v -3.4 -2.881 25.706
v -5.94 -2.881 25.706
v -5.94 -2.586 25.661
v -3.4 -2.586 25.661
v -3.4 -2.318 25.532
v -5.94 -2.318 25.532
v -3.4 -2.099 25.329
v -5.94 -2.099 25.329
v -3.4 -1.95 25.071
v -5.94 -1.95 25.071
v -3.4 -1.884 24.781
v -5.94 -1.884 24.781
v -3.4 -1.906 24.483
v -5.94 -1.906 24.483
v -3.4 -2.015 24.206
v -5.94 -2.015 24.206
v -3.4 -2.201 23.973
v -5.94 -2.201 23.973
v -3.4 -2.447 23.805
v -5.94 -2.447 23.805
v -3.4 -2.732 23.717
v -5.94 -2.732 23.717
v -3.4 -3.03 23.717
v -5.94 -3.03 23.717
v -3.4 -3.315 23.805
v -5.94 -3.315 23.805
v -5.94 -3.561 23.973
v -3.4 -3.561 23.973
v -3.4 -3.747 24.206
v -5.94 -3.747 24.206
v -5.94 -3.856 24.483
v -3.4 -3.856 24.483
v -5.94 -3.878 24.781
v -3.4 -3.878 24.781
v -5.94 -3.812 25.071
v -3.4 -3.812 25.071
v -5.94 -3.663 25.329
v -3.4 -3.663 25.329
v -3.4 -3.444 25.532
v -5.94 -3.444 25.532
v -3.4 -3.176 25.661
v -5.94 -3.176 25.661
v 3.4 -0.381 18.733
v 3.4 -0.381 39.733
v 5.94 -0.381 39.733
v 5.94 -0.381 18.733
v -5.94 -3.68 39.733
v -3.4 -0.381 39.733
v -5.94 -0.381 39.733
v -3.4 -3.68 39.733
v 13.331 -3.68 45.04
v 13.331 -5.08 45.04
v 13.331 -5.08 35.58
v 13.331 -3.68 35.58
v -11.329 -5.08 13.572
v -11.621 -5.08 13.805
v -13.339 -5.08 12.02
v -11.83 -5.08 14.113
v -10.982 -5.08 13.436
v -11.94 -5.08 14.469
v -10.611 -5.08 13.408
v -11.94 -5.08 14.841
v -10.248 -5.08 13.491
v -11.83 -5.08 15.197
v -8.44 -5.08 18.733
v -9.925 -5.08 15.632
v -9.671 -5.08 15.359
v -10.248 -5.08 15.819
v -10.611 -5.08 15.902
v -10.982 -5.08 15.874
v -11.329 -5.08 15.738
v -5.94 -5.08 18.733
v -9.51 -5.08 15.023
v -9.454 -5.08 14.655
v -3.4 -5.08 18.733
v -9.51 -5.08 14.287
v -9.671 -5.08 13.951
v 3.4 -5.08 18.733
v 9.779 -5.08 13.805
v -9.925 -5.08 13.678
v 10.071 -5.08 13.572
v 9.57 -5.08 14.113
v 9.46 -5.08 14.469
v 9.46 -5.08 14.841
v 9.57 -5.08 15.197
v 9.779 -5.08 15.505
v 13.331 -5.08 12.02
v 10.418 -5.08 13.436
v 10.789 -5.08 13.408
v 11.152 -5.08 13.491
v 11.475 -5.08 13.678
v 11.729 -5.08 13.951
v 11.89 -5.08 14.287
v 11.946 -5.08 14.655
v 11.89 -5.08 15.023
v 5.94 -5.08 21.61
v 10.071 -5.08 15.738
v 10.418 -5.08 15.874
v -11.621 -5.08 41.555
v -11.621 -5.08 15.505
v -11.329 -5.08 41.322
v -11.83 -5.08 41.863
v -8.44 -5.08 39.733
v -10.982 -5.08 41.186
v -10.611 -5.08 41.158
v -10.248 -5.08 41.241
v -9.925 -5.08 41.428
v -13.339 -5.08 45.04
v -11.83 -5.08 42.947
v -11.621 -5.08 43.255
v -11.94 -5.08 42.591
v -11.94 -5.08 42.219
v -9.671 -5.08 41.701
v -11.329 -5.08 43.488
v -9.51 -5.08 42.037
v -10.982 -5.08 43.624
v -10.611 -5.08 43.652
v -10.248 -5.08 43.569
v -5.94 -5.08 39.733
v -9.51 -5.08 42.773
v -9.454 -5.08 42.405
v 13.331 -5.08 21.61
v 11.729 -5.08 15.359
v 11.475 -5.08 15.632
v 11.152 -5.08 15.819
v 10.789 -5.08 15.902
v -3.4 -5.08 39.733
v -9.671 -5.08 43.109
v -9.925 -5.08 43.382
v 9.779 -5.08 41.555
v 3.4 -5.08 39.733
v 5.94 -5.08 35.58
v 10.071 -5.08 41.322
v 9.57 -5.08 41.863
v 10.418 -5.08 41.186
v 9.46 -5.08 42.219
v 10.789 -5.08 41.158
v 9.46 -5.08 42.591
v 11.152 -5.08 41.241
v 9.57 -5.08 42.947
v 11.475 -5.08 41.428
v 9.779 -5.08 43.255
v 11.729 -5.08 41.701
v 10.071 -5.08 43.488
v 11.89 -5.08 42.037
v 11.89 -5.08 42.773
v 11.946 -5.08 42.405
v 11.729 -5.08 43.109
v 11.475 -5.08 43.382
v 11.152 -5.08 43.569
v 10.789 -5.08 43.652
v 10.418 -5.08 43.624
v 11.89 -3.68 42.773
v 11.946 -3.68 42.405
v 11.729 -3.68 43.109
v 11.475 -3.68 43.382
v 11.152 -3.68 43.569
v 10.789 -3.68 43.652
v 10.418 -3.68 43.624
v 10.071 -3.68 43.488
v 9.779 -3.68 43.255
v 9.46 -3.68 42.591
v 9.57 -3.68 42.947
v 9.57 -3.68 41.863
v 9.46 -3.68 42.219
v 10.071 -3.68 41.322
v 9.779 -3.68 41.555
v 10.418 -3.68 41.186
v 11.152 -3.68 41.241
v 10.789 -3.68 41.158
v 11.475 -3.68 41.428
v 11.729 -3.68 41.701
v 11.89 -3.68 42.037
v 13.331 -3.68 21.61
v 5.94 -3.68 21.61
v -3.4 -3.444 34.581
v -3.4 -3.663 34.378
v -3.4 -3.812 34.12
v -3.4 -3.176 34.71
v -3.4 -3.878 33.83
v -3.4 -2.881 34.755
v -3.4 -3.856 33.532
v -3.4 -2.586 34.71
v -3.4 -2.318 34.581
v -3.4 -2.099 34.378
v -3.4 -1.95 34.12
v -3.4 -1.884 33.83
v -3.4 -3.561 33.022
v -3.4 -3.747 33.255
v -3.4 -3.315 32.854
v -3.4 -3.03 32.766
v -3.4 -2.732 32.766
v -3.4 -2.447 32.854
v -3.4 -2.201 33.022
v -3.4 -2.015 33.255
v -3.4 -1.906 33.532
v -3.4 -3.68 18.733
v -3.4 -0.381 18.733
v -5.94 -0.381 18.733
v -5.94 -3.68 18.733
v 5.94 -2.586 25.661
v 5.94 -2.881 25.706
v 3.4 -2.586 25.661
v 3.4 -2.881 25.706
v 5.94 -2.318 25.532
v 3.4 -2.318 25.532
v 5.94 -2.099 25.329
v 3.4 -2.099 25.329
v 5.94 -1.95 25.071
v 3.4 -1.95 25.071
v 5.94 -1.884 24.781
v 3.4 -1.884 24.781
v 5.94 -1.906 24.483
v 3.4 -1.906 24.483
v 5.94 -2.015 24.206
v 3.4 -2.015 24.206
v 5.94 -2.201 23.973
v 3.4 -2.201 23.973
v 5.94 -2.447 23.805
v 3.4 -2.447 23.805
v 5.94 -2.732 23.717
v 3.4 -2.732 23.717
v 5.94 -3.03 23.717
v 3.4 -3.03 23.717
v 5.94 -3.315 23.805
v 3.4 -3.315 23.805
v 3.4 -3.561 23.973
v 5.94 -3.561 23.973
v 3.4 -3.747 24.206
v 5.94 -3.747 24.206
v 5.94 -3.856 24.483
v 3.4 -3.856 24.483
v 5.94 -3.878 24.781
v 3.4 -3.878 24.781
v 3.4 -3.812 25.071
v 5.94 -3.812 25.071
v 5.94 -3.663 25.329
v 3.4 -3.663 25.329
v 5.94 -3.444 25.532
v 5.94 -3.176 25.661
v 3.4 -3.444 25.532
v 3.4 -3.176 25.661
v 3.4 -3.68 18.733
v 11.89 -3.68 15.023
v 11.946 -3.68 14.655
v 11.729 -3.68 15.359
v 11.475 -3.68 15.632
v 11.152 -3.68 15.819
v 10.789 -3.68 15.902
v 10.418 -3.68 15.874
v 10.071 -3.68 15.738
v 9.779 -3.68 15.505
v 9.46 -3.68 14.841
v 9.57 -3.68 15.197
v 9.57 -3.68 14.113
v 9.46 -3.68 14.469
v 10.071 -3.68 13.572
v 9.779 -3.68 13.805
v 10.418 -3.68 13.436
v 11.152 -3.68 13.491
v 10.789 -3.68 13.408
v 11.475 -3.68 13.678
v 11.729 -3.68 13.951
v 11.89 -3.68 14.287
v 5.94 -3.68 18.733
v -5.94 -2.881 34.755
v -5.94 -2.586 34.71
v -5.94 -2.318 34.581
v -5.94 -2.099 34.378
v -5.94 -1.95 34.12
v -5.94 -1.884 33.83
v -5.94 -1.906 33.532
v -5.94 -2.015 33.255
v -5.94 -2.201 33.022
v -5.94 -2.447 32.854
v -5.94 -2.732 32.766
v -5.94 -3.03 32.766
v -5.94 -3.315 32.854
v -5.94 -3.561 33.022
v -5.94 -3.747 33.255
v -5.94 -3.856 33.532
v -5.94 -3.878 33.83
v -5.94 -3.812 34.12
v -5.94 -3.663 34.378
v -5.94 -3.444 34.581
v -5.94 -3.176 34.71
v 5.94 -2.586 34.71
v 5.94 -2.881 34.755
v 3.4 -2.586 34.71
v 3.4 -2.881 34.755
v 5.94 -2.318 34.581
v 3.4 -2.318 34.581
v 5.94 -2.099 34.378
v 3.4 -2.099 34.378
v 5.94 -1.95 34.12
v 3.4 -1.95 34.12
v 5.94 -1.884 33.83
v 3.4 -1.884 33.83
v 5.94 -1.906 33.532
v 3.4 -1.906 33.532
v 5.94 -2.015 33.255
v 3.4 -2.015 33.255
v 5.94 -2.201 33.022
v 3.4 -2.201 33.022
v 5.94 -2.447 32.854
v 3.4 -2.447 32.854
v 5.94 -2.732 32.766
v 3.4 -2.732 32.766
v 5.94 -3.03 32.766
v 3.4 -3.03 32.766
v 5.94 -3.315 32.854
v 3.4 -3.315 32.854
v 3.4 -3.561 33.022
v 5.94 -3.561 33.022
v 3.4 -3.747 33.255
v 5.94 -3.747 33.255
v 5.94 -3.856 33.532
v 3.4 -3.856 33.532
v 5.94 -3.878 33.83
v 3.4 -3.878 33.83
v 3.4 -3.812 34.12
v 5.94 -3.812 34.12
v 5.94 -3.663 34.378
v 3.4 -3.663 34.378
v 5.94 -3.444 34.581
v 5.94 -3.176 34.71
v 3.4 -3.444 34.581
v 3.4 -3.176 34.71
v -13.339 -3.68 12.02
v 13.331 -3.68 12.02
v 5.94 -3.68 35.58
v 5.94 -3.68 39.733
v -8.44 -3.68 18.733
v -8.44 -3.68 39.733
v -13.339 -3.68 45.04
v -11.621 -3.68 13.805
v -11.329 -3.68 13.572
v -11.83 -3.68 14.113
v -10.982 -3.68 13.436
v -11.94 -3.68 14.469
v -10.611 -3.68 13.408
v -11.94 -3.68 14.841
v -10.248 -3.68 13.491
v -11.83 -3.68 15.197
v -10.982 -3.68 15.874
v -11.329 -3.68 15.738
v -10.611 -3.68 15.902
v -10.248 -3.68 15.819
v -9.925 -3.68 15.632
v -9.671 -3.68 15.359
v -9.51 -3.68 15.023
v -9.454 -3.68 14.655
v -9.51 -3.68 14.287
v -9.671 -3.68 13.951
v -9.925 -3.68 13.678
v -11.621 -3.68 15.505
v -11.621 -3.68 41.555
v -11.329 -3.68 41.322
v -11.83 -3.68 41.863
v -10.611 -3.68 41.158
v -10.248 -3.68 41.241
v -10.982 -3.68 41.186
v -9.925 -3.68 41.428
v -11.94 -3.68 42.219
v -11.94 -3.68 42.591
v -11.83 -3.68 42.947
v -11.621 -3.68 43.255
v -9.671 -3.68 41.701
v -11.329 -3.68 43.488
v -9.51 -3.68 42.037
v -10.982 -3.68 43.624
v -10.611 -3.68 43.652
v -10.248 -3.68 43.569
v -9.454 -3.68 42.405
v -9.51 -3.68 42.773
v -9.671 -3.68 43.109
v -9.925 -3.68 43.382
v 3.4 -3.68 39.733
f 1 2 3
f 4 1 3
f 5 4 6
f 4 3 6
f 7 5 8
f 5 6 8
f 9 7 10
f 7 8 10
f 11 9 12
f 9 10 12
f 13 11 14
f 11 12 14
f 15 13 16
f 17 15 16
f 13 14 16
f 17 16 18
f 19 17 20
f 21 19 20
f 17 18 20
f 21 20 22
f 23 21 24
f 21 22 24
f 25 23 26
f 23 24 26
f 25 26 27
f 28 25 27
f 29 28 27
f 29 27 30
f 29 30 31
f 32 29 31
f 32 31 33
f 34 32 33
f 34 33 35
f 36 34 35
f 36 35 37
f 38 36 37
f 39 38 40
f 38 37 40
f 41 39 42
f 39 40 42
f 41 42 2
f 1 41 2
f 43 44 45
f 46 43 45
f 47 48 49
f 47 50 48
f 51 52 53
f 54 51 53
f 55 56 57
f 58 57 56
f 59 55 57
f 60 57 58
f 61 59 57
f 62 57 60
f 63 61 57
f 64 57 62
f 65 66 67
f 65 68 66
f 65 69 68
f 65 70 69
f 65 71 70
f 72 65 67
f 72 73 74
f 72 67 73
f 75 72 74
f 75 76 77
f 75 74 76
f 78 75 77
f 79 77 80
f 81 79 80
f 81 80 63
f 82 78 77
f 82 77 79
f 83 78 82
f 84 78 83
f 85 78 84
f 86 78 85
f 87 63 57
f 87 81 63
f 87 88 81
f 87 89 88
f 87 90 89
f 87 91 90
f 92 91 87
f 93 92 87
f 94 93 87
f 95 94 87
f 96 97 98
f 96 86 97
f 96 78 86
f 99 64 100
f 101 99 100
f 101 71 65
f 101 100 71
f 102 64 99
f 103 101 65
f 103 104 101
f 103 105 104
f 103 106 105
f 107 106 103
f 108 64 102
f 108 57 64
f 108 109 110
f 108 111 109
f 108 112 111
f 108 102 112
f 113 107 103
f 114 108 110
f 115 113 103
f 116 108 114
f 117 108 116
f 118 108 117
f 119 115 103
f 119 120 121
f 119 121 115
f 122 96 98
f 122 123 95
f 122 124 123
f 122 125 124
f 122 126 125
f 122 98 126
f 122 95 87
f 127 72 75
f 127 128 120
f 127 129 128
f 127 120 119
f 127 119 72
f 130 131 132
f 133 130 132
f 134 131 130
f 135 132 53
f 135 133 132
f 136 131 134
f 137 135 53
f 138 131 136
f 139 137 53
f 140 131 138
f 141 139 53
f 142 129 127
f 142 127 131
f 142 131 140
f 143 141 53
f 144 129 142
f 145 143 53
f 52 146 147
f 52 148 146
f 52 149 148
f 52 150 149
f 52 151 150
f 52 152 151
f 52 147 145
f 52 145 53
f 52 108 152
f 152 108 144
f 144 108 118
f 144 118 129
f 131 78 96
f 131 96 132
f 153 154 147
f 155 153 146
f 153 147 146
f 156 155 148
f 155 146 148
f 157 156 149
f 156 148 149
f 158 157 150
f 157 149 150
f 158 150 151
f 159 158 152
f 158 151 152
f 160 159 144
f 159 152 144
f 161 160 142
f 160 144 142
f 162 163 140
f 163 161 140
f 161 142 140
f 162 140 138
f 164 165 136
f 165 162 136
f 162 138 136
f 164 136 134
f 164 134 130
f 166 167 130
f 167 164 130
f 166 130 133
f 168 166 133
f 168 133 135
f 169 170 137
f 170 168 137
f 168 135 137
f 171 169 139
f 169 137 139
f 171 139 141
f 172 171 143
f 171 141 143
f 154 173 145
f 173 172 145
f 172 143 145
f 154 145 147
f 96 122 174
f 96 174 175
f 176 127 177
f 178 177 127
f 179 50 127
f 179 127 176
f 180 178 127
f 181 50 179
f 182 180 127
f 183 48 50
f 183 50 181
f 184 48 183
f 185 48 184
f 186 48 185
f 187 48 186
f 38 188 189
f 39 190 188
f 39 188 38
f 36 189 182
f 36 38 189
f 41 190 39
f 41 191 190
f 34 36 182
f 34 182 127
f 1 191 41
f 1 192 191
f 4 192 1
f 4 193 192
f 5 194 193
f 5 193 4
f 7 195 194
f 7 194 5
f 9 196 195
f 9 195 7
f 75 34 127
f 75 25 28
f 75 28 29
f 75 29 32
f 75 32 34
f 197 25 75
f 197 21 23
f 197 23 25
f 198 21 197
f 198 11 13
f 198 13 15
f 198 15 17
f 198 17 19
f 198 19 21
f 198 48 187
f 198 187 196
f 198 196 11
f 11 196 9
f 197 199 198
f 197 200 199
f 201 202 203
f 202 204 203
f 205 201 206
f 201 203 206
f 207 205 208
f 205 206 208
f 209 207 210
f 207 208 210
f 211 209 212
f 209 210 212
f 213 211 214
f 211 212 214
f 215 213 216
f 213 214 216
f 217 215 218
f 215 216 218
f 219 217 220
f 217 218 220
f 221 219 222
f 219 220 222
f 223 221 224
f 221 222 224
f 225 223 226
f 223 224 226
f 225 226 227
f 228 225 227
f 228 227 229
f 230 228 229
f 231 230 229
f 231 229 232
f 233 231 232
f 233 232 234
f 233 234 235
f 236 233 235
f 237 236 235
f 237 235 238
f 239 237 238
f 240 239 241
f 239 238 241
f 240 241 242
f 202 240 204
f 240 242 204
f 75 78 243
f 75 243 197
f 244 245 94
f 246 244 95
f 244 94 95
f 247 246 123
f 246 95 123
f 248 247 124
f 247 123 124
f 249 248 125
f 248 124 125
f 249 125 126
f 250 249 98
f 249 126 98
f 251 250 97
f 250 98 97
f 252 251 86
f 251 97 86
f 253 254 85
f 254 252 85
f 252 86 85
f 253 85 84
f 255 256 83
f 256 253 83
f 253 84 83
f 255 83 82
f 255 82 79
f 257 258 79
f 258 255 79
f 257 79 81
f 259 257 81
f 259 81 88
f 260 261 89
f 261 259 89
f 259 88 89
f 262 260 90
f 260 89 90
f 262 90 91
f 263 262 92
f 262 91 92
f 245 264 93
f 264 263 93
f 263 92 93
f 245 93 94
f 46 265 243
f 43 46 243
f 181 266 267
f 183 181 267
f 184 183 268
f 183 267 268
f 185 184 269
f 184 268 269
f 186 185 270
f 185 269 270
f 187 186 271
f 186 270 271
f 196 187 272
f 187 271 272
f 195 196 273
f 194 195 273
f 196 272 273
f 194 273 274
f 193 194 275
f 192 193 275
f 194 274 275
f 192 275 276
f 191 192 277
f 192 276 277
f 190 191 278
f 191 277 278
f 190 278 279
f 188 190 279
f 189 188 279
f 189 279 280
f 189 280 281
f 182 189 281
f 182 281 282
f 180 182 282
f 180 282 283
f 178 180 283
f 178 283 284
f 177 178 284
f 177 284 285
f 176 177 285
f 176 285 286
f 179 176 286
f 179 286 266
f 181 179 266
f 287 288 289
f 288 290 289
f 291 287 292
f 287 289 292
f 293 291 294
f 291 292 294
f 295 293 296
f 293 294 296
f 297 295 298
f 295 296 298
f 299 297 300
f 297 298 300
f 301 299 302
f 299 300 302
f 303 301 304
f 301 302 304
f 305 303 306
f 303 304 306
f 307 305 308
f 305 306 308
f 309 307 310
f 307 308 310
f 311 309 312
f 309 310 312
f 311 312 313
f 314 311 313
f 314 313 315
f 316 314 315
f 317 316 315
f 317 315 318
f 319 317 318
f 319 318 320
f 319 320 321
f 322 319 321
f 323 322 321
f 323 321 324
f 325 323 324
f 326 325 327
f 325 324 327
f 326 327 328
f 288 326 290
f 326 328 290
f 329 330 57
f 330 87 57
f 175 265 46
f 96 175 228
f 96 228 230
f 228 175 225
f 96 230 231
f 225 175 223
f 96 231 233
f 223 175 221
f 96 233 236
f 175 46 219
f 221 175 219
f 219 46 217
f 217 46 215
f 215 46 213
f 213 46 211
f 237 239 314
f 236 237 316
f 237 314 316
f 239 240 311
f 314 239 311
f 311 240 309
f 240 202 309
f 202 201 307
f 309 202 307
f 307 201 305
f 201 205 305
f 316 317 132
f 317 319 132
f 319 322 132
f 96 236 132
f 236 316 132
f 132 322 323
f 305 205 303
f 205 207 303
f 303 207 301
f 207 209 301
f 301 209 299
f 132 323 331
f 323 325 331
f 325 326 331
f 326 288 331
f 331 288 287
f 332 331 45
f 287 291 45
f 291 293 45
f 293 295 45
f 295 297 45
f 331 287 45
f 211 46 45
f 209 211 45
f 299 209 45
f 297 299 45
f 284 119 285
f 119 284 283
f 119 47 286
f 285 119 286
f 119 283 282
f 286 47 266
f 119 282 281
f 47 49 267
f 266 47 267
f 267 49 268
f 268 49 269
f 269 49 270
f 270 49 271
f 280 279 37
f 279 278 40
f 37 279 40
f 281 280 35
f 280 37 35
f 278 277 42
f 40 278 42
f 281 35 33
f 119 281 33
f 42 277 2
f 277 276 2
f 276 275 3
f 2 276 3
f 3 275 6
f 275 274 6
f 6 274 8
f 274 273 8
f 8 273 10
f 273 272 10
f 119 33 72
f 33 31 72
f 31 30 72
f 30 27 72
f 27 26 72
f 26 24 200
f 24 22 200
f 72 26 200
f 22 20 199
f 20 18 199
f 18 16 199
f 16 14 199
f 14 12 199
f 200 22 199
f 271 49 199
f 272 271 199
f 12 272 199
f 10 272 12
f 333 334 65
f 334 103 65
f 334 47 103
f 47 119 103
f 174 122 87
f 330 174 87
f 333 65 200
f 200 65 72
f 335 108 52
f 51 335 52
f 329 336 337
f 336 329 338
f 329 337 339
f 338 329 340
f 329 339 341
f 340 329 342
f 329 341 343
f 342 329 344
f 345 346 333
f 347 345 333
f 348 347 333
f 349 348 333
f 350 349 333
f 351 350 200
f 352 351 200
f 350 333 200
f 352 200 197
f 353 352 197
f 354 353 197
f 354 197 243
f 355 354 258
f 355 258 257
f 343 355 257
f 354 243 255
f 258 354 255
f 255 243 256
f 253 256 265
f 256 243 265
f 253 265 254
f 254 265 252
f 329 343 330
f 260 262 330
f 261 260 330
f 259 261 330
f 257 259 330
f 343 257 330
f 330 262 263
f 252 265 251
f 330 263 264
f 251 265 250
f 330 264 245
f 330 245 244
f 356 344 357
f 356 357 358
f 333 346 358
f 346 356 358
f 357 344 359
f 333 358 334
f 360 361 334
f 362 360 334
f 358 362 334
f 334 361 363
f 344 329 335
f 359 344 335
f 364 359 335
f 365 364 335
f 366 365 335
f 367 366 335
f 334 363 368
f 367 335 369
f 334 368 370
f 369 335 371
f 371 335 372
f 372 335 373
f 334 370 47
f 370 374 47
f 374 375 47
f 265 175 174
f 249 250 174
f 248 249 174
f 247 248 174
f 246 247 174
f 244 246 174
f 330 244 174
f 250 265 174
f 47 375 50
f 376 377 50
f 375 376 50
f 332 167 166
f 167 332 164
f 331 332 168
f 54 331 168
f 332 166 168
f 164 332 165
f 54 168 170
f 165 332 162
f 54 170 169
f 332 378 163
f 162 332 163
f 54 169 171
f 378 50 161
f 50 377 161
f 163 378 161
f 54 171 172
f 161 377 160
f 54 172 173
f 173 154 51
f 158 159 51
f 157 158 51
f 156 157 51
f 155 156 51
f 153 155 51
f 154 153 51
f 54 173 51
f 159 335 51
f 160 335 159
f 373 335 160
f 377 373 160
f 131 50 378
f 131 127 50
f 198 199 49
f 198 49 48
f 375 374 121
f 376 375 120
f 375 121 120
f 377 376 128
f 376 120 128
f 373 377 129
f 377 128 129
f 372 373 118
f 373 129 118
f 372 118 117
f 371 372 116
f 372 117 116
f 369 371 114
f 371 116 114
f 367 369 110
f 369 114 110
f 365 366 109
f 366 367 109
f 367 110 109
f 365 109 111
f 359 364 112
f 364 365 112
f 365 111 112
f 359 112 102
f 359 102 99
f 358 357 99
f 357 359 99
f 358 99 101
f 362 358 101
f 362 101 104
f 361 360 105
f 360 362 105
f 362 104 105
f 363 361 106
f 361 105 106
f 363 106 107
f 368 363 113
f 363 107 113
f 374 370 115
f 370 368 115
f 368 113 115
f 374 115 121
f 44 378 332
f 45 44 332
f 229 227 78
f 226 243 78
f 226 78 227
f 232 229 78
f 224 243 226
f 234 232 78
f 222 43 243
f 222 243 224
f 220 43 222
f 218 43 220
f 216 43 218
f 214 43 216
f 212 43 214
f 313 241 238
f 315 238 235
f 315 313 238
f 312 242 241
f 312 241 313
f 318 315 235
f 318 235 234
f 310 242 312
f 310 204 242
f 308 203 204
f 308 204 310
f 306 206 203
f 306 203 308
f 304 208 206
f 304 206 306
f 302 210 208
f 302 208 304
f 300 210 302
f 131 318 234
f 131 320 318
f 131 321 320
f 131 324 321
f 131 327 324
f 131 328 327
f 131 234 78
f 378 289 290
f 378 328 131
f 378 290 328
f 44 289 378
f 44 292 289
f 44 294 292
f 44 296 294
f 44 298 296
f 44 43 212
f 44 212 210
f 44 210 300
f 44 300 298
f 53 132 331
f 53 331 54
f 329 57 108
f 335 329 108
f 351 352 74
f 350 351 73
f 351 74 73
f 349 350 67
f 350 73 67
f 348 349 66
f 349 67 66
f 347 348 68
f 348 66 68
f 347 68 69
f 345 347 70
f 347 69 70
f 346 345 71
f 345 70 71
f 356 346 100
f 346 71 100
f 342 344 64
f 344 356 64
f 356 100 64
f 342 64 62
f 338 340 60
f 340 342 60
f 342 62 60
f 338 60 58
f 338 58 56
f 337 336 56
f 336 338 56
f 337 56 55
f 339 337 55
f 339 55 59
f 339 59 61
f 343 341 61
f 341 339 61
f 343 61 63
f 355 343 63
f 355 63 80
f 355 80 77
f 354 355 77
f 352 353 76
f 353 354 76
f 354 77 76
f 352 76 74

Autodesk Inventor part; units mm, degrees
ref_plane "YZ Plane" through (0, 0, 0) normal (1, 0, 0) x (0, 1, 0)
ref_plane "XZ Plane" through (0, 0, 0) normal (0, 1, 0) x (-1, 0, 0)
ref_plane "XY Plane" through (0, 0, 0) normal (0, 0, 1) x (1, 0, 0)
sketch "Sketch1" plane through (0, 0, 0) normal (0, 0, 1) x (1, 0, 0)
  line L0 (-31.75, 5.08) -> (31.75, 5.08)
  line L1 (31.75, 5.08) -> (31.75, -5.08)
  line L2 (31.75, -5.08) -> (-31.75, -5.08)
  line L3 (-31.75, -5.08) -> (-31.75, 5.08)
  point P0 (0, 0)
  dimension "d0" = 63.5
  dimension "d3" = 31.75
  dimension "d4" = 10.16
  dimension "d17" = 5.08
extrude "Extrusion1" add sketch "Sketch1" along normal blind 76.2
sketch "Sketch9" plane through (-31.75, 5.08, 0) normal (0, 1, 0) x (1, 0, 0)
  line L0 (28.35, -18.7333) -> (35.15, -18.7333)
  line L1 (35.15, -18.7333) -> (35.15, -39.7333)
  line L2 (35.15, -39.7333) -> (28.35, -39.7333)
  line L3 (28.35, -39.7333) -> (28.35, -18.7333)
  line L4 (0, 0) -> (0, -76.2) projected
  line L5 (63.5, 0) -> (0, 0) projected
  point P0 (31.75, 0)
  point P1 (0, -38.1)
  dimension "d31" = 21
  dimension "d32" = 6.8
  dimension "d33" = 28.35
  dimension "d34" = 18.7333
extrude "Extrusion8" cut sketch "Sketch9" against normal blind 19.5
sketch "Sketch28" plane through (-31.75, -5.08, 0) normal (0, -1, 0) x (1, 0, 0)
  line L0 (51.7099, 9.6993) -> (7.0225, 9.6993)
  line L1 (51.7099, 55.2865) -> (51.7099, 9.6993)
  line L2 (44.4458, 44.405) -> (19.0458, 44.405)
  line L3 (19.0458, 44.405) -> (19.0458, 12.655)
  line L4 (19.0458, 12.655) -> (44.4458, 12.655)
  line L5 (44.4458, 12.655) -> (44.4458, 44.405)
  line L6 (23.85, 39.7333) -> (30.65, 39.7333)
  line L7 (41.4458, 41.405) -> (22.0458, 41.405)
  line L8 (22.0458, 41.405) -> (22.0458, 15.655)
  line L9 (22.0458, 15.655) -> (41.4458, 15.655)
  line L10 (41.4458, 15.655) -> (41.4458, 41.405)
  circle A0 centre (42.4458, 42.405) radius 1.25
  circle A1 centre (42.4458, 14.655) radius 1.25
  circle A2 centre (21.0458, 14.655) radius 1.25
  circle A3 centre (21.0458, 42.405) radius 1.25
  line L11 (35.15, 39.7333) -> (35.15, 18.7333)
  line L12 (35.15, 18.7333) -> (28.35, 18.7333)
  line L13 (28.35, 18.7333) -> (28.35, 39.7333)
  line L14 (28.35, 39.7333) -> (35.15, 39.7333)
  line L15 (35.15, 39.7333) -> (35.15, 18.7333) projected
  line L16 (63.5, 0) -> (63.5, 76.2) projected
  line L17 (0, 76.2) -> (63.5, 76.2) projected
  line L18 (63.5, 0) -> (0, 0)
  line L19 (0, 0) -> (0, 76.2)
  line L20 (0, 76.2) -> (63.5, 76.2)
  line L21 (63.5, 76.2) -> (63.5, 0)
  point P0 (31.75, 0)
  point P1 (31.7458, 15.655)
  dimension "d175" = 31.75
  dimension "d176" = 25.4
  dimension "d177" = 3
  dimension "d178" = 3
  dimension "d179" = 3
  dimension "d180" = 3
  dimension "d181" = 2.5
  dimension "d182" = 2
  dimension "d183" = 2
  dimension "d184" = 2.5
  dimension "d185" = 2.5
  dimension "d186" = 2.5
  dimension "d188" = 2
  dimension "d190" = 2
  dimension "d191" = 2
  dimension "d192" = 2
  dimension "d193" = 0
  dimension "d194" = 6.8
  dimension "d195" = 21
  dimension "d196" = 6.2958
  dimension "d197" = 3.0783
  dimension "d268" = 2
  dimension "d269" = 2
extrude "Extrusion18" cut sketch "Sketch28" against normal blind 25.4 contours L18 L19 L17 L16
extrude "Extrusion19" cut sketch "Sketch28" against normal blind 25.4 contours A0 | A1 | A2 | A3
sketch "Sketch29" plane through (-12.7042, -5.08, 12.655) normal (-1, 0, 0) x (0, 0, 1)
  line L0 (0, 10.16) -> (31.75, 10.16) projected
  line L1 (0, 0) -> (0, 10.16) projected
  line L2 (31.75, 0) -> (0, 0) projected
  line L3 (31.75, 0) -> (31.75, 10.16) projected
  line L4 (31.75, 0) -> (31.75, 10.16) projected
  line L5 (31.75, 0) -> (0, 0)
  line L6 (0, 0) -> (0, 1)
  line L7 (0, 1) -> (31.75, 1)
  line L8 (31.75, 1) -> (31.75, 0)
  line L9 (31.75, 1) -> (0, 1)
  line L10 (0, 1) -> (0, 10.16)
  line L11 (0, 10.16) -> (31.75, 10.16)
  line L12 (31.75, 10.16) -> (31.75, 1)
  point P0 (-12.655, 5.08)
  point P1 (31.75, 1)
  dimension "d202" = 1
extrude "Extrusion20" cut sketch "Sketch29" against normal blind 25.4 contours L0 L3 L7 L1
sketch "Sketch30" plane through (-12.7042, -4.08, 44.405) normal (0, 1, 0) x (1, 0, 0)
  line L0 (9.3042, 25.6717) -> (9.3042, 4.6717) projected
  circle A0 centre (2, 29.75) radius 1.25 projected
  circle A1 centre (23.4, 29.75) radius 1.25 projected
  circle A2 centre (2, 2) radius 1.25 projected
  circle A3 centre (23.4, 2) radius 1.25 projected
  line L1 (9.3042, 25.6717) -> (9.3042, 4.6717) projected
  line L2 (16.1042, 25.6717) -> (9.3042, 25.6717) projected
  line L3 (16.1042, 4.6717) -> (16.1042, 25.6717) projected
  line L4 (9.3042, 4.6717) -> (16.1042, 4.6717) projected
  line L5 (0, 0) -> (0, 31.75) projected
  line L6 (25.4, 0) -> (0, 0) projected
  line L7 (25.4, 31.75) -> (25.4, 0) projected
  line L8 (0, 31.75) -> (25.4, 31.75) projected
  line L9 (9.3042, 4.6717) -> (16.1042, 4.6717) projected
  line L10 (9.3042, 4.6717) -> (6.7642, 4.6717)
  line L11 (6.7642, 4.6717) -> (6.7642, 25.6717)
  line L12 (6.7642, 25.6717) -> (9.3042, 25.6717)
  line L13 (9.3042, 25.6717) -> (9.3042, 4.6717)
  line L14 (16.1042, 4.6717) -> (18.6442, 4.6717)
  line L15 (18.6442, 4.6717) -> (18.6442, 25.6717)
  line L16 (18.6442, 25.6717) -> (16.1042, 25.6717)
  line L17 (16.1042, 25.6717) -> (16.1042, 4.6717)
  point P0 (12.7042, 44.405)
  point P1 (9.3042, 25.6717)
  dimension "d205" = 2.54
  dimension "d206" = 2.54
extrude "Extrusion21" add sketch "Sketch30" along normal blind 3.699 contours L0 L10 L11 L12 | L16 L15 L14 L3
sketch "Sketch31" plane through (-5.94, -4.08, 18.7333) normal (-1, 0, 0) x (0, 0, 1)
  circle A0 centre (15.0216, 1.199) radius 1
  circle A1 centre (5.9726, 1.199) radius 1
  line L0 (0, 3.699) -> (21, 3.699) projected
  line L1 (21, 0) -> (21, 3.699) projected
  line L2 (0, 0) -> (0, 3.699) projected
  line L3 (16.0216, 0.199) -> (4.9726, 0.199)
  line L4 (4.9726, 0.199) -> (4.9726, 2.199)
  line L5 (4.9726, 2.199) -> (16.0216, 2.199)
  line L6 (16.0216, 2.199) -> (16.0216, 0.199)
  point P0 (-18.7333, 4.08)
  point P1 (21, 1.8495)
  dimension "d209" = 2
  dimension "d210" = 2
  dimension "d213" = 2.5
  dimension "d214" = 2.5
  dimension "d227" = 11.049
  dimension "d228" = 21
  dimension "d229" = 4.9784
extrude "Extrusion22" cut sketch "Sketch31" against normal blind 25.4 contours A0 | A1
sketch "Sketch32" plane through (-12.7042, -4.08, 44.405) normal (0, 1, 0) x (1, 0, 0)
  line L0 (18.6442, 4.6717) -> (16.1042, 4.6717) projected
  line L1 (9.3042, 4.6717) -> (16.1042, 4.6717) projected
  line L2 (9.3042, 4.6717) -> (6.7642, 4.6717) projected
  line L3 (6.7642, 4.6717) -> (6.7642, 25.6717) projected
  line L4 (6.7642, 25.6717) -> (9.3042, 25.6717) projected
  line L5 (16.1042, 25.6717) -> (9.3042, 25.6717) projected
  line L6 (16.1042, 25.6717) -> (18.6442, 25.6717) projected
  line L7 (18.6442, 25.6717) -> (18.6442, 4.6717) projected
  circle A0 centre (2, 29.75) radius 1.25 projected
  circle A1 centre (23.4, 29.75) radius 1.25 projected
  circle A2 centre (2, 2) radius 1.25 projected
  circle A3 centre (23.4, 2) radius 1.25 projected
  line L8 (0, 0) -> (0, 31.75) projected
  line L9 (25.4, 0) -> (0, 0) projected
  line L10 (25.4, 31.75) -> (25.4, 0) projected
  line L11 (0, 31.75) -> (25.4, 31.75) projected
  line L12 (6.7642, 25.6717) -> (4.2642, 25.6717)
  line L13 (4.2642, 25.6717) -> (4.2642, 4.6717)
  line L14 (4.2642, 4.6717) -> (6.7642, 4.6717)
  line L15 (6.7642, 4.6717) -> (6.7642, 25.6717)
  line L16 (18.6442, 25.6717) -> (21.1442, 25.6717)
  line L17 (21.1442, 25.6717) -> (21.1442, 4.6717)
  line L18 (21.1442, 4.6717) -> (18.6442, 4.6717)
  line L19 (18.6442, 4.6717) -> (18.6442, 25.6717)
  line L20 (6.7642, 12.6346) -> (4.2642, 12.6346)
  line L21 (4.2642, 12.6346) -> (4.2642, 18.9846)
  line L22 (4.2642, 18.9846) -> (6.7642, 18.9846)
  line L23 (6.7642, 18.9846) -> (6.7642, 12.6346)
  line L24 (18.6442, 12.6346) -> (21.1442, 12.6346)
  line L25 (21.1442, 12.6346) -> (21.1442, 18.9846)
  line L26 (21.1442, 18.9846) -> (18.6442, 18.9846)
  line L27 (18.6442, 18.9846) -> (18.6442, 12.6346)
  point P0 (12.7042, 44.405)
  point P1 (6.7642, 4.6717)
  point P2 (19.8942, 12.6346)
  point P3 (6.7642, 12.6346)
  point P4 (4.2642, 12.6346)
  point P5 (6.7642, 18.9846)
  point P6 (18.6442, 18.9846)
  point P7 (5.5142, 18.9846)
  dimension "d217" = 2.5
  dimension "d218" = 2.5
  dimension "d221" = 6.35
  dimension "d222" = 21
  dimension "d223" = 7.9629
extrude "Extrusion23" cut sketch "Sketch32" against normal blind 25.4 contours L7 L24 L17 L18 | L7 L16 L17 L26 | L14 L13 L20 L3 | L22 L13 L12 L3
sketch "Sketch33" plane through (-12.7042, -5.08, 12.655) normal (0, -1, 0) x (1, 0, 0)
  line L0 (16.1042, 11.0509) -> (18.6442, 11.0509) projected
  line L1 (16.1042, 13.0509) -> (18.6442, 13.0509) projected
  line L2 (16.1042, 20.0999) -> (16.1042, 22.0999) projected
  line L3 (16.1042, 20.0999) -> (18.6442, 20.0999) projected
  line L4 (16.1042, 22.0999) -> (18.6442, 22.0999) projected
  line L5 (21.1442, 6.0783) -> (21.1442, 12.7654) projected
  line L6 (25.4, 0) -> (25.4, 31.75) projected
  line L7 (18.6442, 8.9554) -> (25.4, 8.9554)
  line L8 (25.4, 8.9554) -> (25.4, 14.0354)
  line L9 (25.4, 14.0354) -> (18.6442, 14.0354)
  line L10 (18.6442, 14.0354) -> (18.6442, 8.9554)
  line L11 (21.1442, 27.0783) -> (21.1442, 19.1154) projected
  line L12 (18.6442, 17.8454) -> (25.4, 17.8454)
  line L13 (25.4, 17.8454) -> (25.4, 22.9254)
  line L14 (25.4, 22.9254) -> (18.6442, 22.9254)
  line L15 (18.6442, 22.9254) -> (18.6442, 17.8454)
  line L16 (18.6442, 12.7654) -> (21.1442, 12.7654) projected
  line L17 (21.1442, 19.1154) -> (18.6442, 19.1154) projected
  line L18 (18.6442, 19.1154) -> (18.6442, 27.0783) projected
  line L19 (18.6442, 6.0783) -> (18.6442, 12.7654) projected
  point P0 (12.7042, -12.655)
  point P1 (21.1442, 22.9254)
  point P2 (20.8442, 13.4004)
  point P3 (25.4, 8.9554)
  point P4 (19.8942, 12.7654)
  point P5 (20.8442, 13.4004)
  point P6 (18.6442, 12.7654)
  point P7 (21.1442, 8.9554)
  point P8 (18.6442, 8.9554)
  dimension "d235" = 5.08
  dimension "d236" = 3.81
  dimension "d237" = 1.27
  dimension "d239" = 1.27
  dimension "d240" = 0
  dimension "d241" = 0
extrude "Extrusion24" cut sketch "Sketch33" against normal blind 25.4 contours L6 L7 L5 L16 L10 L9 | L15 L14 L11 L17 | L17 L11 L14 L6 L12 L15 | L7 L10 L16 L5
sketch "Sketch36" plane through (-12.7042, -5.08, 44.405) normal (0, -1, 0) x (1, 0, 0)
  line L0 (18.6442, -17.7146) -> (25.4, -17.7146) projected
  line L1 (25.4, -13.9046) -> (18.6442, -13.9046) projected
  line L2 (18.6442, -17.7146) -> (25.4, -17.7146)
  line L3 (25.4, -17.7146) -> (25.4, -13.9046)
  line L4 (25.4, -13.9046) -> (18.6442, -13.9046)
  line L5 (18.6442, -13.9046) -> (18.6442, -17.7146)
  point P0 (12.7042, -44.405)
extrude "Extrusion26" cut sketch "Sketch36" against normal blind 1
sketch "Sketch37" plane through (-12.7042, -5.08, 44.405) normal (0, -1, 0) x (1, 0, 0)
  line L0 (25.4, -8.8246) -> (25.4, 0) projected
  line L1 (0, -31.75) -> (25.4, -31.75) projected
  line L2 (25.4, 0) -> (0, 0)
  line L3 (0, 0) -> (0, -31.75)
  line L4 (0, -31.75) -> (25.4, -31.75)
  line L5 (25.4, -31.75) -> (25.4, 0)
  line L6 (26.035, 0.635) -> (-0.635, 0.635)
  line L7 (-0.635, 0.635) -> (-0.635, -32.385)
  line L8 (-0.635, -32.385) -> (26.035, -32.385)
  line L9 (26.035, -32.385) -> (26.035, 0.635)
  line L10 (26.035, -8.8246) -> (25.4, -8.8246)
  line L11 (18.6442, -22.1596) -> (25.4, -22.1596) projected
  line L12 (25.4, -22.7946) -> (26.035, -22.7946)
  point P0 (12.7042, -44.405)
  dimension "d247" = 0.635
extrude "Extrusion27" add sketch "Sketch37" against normal blind 1 contours L0 L2 L3 L1 L5 L12 L9 L8 L7 L6 L10
sketch "Sketch39" plane through (-3.4, -4.08, 39.7333) normal (0, 1, 0) x (1, 0, 0)
  line L0 (9.34, 0) -> (6.8, 0) projected
  line L1 (0, 0) -> (6.8, 0) projected
  line L2 (0, 0) -> (-2.54, 0) projected
  line L3 (-2.54, 0) -> (-5.04, 0) projected
  line L4 (-5.04, 0) -> (-5.04, 7.9629) projected
  line L5 (-5.04, 7.9629) -> (-2.54, 7.9629) projected
  line L6 (-2.54, 7.9629) -> (-2.54, 14.3129) projected
  line L7 (-2.54, 14.3129) -> (-5.04, 14.3129) projected
  line L8 (-5.04, 14.3129) -> (-5.04, 21) projected
  line L9 (-5.04, 21) -> (-2.54, 21) projected
  line L10 (-2.54, 21) -> (0, 21) projected
  line L11 (6.8, 21) -> (0, 21) projected
  line L12 (6.8, 21) -> (9.34, 21) projected
  line L13 (16.7308, 18.1229) -> (16.7308, 27.7133) projected
  line L14 (16.7308, 27.7133) -> (-9.9392, 27.7133) projected
  line L15 (-9.9392, 27.7133) -> (-9.9392, -5.3067) projected
  line L16 (-9.9392, -5.3067) -> (16.7308, -5.3067) projected
  line L17 (16.7308, -5.3067) -> (16.7308, 4.1529) projected
  circle A0 centre (-7.3042, 25.0783) radius 1.25 projected
  circle A1 centre (14.0958, 25.0783) radius 1.25 projected
  circle A2 centre (-7.3042, -2.6717) radius 1.25 projected
  circle A3 centre (14.0958, -2.6717) radius 1.25 projected
  line L18 (16.7308, 4.1529) -> (11.84, 4.1529) projected
  line L19 (11.84, 4.1529) -> (11.84, 0) projected
  line L20 (9.34, 21) -> (11.84, 21) projected
  line L21 (11.84, 21) -> (11.84, 18.1229) projected
  line L22 (11.84, 18.1229) -> (16.7308, 18.1229) projected
  line L23 (9.34, 0) -> (9.34, 21) projected
  line L24 (11.84, 3.5179) -> (9.34, 3.5179)
  line L25 (9.34, 3.5179) -> (9.34, 0)
  line L26 (9.34, 0) -> (11.84, 0)
  line L27 (11.84, 0) -> (11.84, 3.5179)
  line L28 (11.84, 0) -> (9.34, 0) projected
  point P0 (3.4, 39.7333)
  point P1 (9.34, 3.5179)
extrude "Extrusion28" add sketch "Sketch39" along normal blind 0.4 contours L26 L19 L18 L17 L16 L15 L14 L13 L22 L21 L20 L12 L11 L10 L9 L8 L7 L6 L5 L4 L3 L2 L1 L0
sketch "Sketch40" plane through (5.94, -5.08, 18.7333) normal (0, -1, 0) x (1, 0, 0)
  line L0 (-14.38, 6.6871) -> (-11.88, 6.6871) projected
  line L1 (-11.88, 6.6871) -> (-11.88, 0) projected
  line L2 (-11.88, 0) -> (-14.38, 0) projected
  line L3 (-14.38, 0) -> (-14.38, 6.6871) projected
  line L4 (0, 0) -> (0, 21) projected
  line L5 (2.5, 21) -> (2.5, 16.8471) projected
  line L6 (2.5, 16.8471) -> (7.3908, 16.8471) projected
  line L7 (7.3908, 16.8471) -> (7.3908, 26.3067) projected
  line L8 (7.3908, 26.3067) -> (-19.2792, 26.3067) projected
  line L9 (-19.2792, 26.3067) -> (-19.2792, -6.7133) projected
  line L10 (-19.2792, -6.7133) -> (7.3908, -6.7133) projected
  line L11 (7.3908, -6.7133) -> (7.3908, 2.8771) projected
  line L12 (7.3908, 2.8771) -> (2.5, 2.8771) projected
  line L13 (2.5, 2.8771) -> (2.5, 0) projected
  line L14 (2.5, 0) -> (0, 0) projected
  line L15 (-11.88, 13.0371) -> (-14.38, 13.0371) projected
  line L16 (-14.38, 13.0371) -> (-14.38, 21) projected
  line L17 (-14.38, 21) -> (-11.88, 21) projected
  line L18 (-11.88, 21) -> (-11.88, 13.0371) projected
  circle A0 centre (-16.6442, -4.0783) radius 1.25 projected
  circle A1 centre (4.7558, -4.0783) radius 1.25 projected
  circle A2 centre (-16.6442, 23.6717) radius 1.25 projected
  circle A3 centre (4.7558, 23.6717) radius 1.25 projected
  line L19 (-2.54, 21) -> (-2.54, 0) projected
  line L20 (-2.54, 0) -> (-9.34, 0) projected
  line L21 (-9.34, 0) -> (-9.34, 21) projected
  line L22 (-9.34, 21) -> (-2.54, 21) projected
  line L23 (0, 21) -> (0, 0) projected
  line L24 (2.5, 17.4821) -> (0, 17.4821)
  line L25 (0, 17.4821) -> (0, 16.8471)
  line L26 (0, 16.8471) -> (2.5, 16.8471)
  line L27 (2.5, 16.8471) -> (2.5, 17.4821)
  line L28 (2.5, 2.8771) -> (0, 2.8771)
  line L29 (0, 2.8771) -> (0, 0)
  line L30 (0, 0) -> (2.5, 0)
  line L31 (2.5, 0) -> (2.5, 2.8771)
  line L32 (0, 21) -> (2.5, 21) projected
  point P0 (-5.94, -18.7333)
  point P1 (0, 17.4821)
extrude "Extrusion30" add sketch "Sketch40" against normal blind 1.4 contours L4 L28 L13 L14 | L4 L24 L5 L26 | L4 L32 L5 L24
sketch "Sketch41" plane through (5.94, -5.08, 21.6104) normal (0, -1, 0) x (1, 0, 0)
  line L0 (-11.88, 10.16) -> (-14.38, 10.16)
  line L1 (-14.38, 10.16) -> (-14.38, 3.81)
  line L2 (-14.38, 3.81) -> (-11.88, 3.81)
  line L3 (-11.88, 3.81) -> (-11.88, 10.16)
  point P0 (-5.94, -21.6104)
extrude "Extrusion31" cut sketch "Sketch41" against normal blind 25.4
properties part number "Scanner_Test_Top"
